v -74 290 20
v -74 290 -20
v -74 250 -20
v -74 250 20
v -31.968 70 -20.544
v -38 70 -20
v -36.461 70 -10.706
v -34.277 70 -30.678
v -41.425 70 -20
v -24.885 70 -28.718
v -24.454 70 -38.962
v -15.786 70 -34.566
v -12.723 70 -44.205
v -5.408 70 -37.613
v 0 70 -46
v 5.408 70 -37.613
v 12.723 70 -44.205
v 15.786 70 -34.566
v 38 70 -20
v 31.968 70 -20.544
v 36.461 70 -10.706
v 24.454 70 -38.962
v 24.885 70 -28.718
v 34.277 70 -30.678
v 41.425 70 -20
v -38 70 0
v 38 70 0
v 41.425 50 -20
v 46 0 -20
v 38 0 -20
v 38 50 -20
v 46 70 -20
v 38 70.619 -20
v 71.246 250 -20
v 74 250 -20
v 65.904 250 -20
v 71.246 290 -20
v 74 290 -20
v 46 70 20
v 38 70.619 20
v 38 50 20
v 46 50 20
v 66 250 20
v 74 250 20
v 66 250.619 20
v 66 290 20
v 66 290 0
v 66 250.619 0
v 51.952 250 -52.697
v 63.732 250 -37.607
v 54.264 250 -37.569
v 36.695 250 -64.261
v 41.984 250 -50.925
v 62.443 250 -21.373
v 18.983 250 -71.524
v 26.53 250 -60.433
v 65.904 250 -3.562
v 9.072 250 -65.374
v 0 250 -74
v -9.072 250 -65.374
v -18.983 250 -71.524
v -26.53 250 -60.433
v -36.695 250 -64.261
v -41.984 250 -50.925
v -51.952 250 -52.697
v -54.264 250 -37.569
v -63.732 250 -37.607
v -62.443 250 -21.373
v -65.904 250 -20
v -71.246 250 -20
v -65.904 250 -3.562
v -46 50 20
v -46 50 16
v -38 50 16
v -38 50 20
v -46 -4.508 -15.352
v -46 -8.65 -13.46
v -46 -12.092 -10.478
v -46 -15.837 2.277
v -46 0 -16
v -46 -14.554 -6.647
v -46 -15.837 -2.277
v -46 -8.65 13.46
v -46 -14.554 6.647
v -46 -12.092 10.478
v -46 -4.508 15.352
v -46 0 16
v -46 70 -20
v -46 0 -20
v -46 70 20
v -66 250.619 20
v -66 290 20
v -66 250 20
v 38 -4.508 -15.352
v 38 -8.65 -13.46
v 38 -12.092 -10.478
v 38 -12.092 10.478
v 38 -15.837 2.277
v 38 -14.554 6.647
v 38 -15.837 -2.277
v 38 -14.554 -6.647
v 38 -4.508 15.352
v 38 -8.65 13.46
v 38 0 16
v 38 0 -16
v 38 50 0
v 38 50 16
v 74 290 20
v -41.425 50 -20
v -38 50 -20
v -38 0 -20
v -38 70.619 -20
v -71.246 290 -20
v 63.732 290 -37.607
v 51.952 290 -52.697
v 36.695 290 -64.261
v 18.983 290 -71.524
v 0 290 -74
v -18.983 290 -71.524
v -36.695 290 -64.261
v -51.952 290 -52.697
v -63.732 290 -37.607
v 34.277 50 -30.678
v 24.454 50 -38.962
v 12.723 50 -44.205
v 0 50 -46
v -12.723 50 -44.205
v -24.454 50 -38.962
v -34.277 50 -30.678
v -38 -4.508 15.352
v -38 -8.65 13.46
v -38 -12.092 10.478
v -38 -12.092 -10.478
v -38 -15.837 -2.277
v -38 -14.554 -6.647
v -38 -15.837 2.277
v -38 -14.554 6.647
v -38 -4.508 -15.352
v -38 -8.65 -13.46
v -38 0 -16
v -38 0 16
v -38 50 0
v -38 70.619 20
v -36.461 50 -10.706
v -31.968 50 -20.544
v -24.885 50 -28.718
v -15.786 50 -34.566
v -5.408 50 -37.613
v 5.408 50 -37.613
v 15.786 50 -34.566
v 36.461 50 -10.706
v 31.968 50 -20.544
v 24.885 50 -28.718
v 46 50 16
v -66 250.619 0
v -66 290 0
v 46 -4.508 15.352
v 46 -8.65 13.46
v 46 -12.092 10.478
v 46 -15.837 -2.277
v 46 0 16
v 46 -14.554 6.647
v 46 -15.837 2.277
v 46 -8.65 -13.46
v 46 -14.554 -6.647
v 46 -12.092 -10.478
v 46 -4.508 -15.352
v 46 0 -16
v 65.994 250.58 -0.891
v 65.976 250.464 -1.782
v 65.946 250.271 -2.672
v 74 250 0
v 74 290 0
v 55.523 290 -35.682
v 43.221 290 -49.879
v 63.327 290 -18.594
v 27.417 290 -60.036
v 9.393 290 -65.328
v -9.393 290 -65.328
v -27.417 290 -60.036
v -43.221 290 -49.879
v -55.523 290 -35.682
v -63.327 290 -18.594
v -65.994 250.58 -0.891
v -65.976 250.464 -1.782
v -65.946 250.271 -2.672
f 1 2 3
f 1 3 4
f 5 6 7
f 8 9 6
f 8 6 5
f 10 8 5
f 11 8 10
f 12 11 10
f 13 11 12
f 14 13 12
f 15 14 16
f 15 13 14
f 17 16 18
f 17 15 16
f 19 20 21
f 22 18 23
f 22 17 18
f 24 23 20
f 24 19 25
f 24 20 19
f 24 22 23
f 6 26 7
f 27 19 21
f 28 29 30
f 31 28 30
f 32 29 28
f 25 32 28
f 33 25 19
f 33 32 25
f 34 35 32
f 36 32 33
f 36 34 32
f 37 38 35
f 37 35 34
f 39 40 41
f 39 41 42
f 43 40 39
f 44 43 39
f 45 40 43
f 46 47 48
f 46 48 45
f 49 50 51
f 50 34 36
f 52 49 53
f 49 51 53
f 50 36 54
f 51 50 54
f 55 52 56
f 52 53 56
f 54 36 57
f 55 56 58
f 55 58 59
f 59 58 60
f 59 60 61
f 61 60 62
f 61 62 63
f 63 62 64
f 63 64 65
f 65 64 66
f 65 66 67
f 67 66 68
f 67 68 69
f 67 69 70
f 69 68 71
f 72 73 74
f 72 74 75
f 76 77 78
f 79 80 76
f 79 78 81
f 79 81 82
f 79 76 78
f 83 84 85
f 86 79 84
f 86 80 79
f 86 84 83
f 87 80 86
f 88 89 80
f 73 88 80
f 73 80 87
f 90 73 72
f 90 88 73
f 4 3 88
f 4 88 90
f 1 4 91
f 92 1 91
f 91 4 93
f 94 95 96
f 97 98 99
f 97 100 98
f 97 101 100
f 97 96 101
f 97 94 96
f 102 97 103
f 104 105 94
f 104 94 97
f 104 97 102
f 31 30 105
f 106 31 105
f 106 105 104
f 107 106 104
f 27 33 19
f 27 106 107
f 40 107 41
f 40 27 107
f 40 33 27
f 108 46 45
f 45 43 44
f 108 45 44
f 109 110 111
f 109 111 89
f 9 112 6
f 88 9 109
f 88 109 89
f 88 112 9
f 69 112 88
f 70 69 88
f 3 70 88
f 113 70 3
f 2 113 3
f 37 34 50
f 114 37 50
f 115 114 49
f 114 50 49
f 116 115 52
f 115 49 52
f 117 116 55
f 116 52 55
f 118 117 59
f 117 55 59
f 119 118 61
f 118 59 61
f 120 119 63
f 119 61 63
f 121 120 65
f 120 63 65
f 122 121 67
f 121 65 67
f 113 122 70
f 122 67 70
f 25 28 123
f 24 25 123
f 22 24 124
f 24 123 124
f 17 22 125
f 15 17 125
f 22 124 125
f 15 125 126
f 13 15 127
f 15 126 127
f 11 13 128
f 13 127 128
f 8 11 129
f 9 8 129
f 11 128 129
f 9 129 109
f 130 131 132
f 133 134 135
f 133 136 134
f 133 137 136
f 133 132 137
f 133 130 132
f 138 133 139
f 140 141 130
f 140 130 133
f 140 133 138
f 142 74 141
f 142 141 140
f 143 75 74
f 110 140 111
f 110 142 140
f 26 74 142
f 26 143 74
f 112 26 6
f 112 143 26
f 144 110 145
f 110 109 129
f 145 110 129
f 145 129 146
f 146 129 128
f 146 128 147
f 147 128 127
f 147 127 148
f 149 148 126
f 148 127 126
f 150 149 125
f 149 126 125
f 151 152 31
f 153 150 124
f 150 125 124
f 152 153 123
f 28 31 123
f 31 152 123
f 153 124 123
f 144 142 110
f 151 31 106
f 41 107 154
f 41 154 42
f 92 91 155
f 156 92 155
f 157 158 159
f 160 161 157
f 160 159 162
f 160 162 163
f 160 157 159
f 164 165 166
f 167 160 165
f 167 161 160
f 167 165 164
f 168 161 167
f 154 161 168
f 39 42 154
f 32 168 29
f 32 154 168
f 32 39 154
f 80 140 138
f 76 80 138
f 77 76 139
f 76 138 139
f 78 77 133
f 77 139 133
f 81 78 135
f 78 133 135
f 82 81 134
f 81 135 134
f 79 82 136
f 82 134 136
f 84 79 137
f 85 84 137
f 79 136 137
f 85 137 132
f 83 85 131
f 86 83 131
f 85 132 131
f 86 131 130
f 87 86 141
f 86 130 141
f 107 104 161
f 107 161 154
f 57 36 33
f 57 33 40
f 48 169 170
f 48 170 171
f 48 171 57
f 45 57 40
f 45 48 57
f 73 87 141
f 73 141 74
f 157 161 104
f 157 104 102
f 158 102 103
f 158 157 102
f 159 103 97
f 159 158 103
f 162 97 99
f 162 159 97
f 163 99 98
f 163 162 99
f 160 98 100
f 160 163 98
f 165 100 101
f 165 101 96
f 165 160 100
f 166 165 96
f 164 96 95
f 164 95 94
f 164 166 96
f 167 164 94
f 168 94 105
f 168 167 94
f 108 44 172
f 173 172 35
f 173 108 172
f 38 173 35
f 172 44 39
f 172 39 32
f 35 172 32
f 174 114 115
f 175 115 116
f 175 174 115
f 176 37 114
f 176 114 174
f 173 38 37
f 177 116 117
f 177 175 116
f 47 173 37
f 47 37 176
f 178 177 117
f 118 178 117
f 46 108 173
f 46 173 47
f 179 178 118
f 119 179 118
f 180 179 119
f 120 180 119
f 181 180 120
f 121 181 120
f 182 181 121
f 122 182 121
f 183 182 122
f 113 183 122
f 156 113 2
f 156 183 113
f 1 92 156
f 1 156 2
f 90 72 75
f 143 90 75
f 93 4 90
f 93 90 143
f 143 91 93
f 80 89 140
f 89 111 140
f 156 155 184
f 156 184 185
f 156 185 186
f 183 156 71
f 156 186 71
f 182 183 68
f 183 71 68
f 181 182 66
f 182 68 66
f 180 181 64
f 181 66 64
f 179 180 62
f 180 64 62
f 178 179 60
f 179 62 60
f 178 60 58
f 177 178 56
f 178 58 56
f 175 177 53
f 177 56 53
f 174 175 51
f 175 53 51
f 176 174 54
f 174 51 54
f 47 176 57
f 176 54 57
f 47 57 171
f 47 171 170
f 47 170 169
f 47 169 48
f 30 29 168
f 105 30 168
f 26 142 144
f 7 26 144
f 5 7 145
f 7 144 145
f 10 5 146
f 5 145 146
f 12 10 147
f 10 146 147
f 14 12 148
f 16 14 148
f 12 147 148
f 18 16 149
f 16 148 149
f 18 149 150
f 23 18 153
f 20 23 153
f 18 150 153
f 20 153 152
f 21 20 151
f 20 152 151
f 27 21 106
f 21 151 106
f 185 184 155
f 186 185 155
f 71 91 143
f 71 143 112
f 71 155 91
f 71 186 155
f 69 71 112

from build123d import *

# Parameters (mm, degrees)
EXTRUDE_4_DEPTH     = 20
EXTRUDE_START       = 50
EXTRUDE_8_DEPTH     = 20
SKETCH_16_W         = 8
SKETCH_16_H         = 40
SKETCH_19_W         = 8
SKETCH_19_H         = 40
SKETCH_21_R         = 16
EXTRUDE_13_DEPTH    = 8
EXTRUDE_START_2     = -8
SKETCH_22_R         = 16
EXTRUDE_14_DEPTH    = 8
SKETCH_23_W         = 7.590296008
SKETCH_23_H         = 50
CUT_EXTRUDE_2_DEPTH = 323.453097365


# Read off the part's stored shape, not the designer's step: 凸台-拉伸8
with BuildPart() as part:
    # Sketch 3D_1 → 凸台-拉伸4 (new, symmetric)
    with BuildSketch(Plane(origin=(-74, 270, 0), x_dir=(0.9909924304103234, 0, 0.13391789600139506), z_dir=(0, -1, 0))):
        with BuildLine():
            Line((0, 0), (2.67835792, 19.819848608))
            Line((2.67835792, 19.819848608), (10.606297363, 18.74850544))
            Line((10.606297363, 18.74850544), (7.927939443, -1.071343168))
            ThreePointArc((7.927939443, -1.071343168), (64.494858714, -75.315424711), (138.738940257, -18.74850544))
            Line((138.738940257, -18.74850544), (141.417298177, 1.071343168))
            Line((141.417298177, 1.071343168), (149.345237621, 0))
            Line((149.345237621, 0), (146.666879701, -19.819848608))
            ThreePointArc((146.666879701, -19.819848608), (63.423515546, -83.243364154), (0, 0))
        make_face()
    extrude(amount=EXTRUDE_4_DEPTH, both=True)



with BuildPart() as body_2:
    # 凸台-拉伸8 outline → 凸台-拉伸8 (new body)
    with BuildSketch(Plane(origin=(0, 0, 0), x_dir=(1, 0, 0), z_dir=(0, 1, 0)).offset(EXTRUDE_START)):
        with BuildLine():
            Line((38, 0), (38, -20))
            Line((38, -20), (46, -20))
            Line((46, -20), (46, 0))
            ThreePointArc((46, 0), (0, 46), (-46, 0))
            Line((-46, 0), (-46, -20))
            Line((-46, -20), (-38, -20))
            Line((-38, -20), (-38, 0))
            ThreePointArc((-38, 0), (0, 38), (38, 0))
        make_face()
    extrude(amount=EXTRUDE_8_DEPTH)


with BuildPart() as part_1:
    add(part.part)

    add(body_2.part)  # 扫描5 merges body 2
    # 扫描5: sweep along a path in 草图18
    with BuildLine(Plane.XY.offset(20)) as sweep_5_path:
        Line((-46, 0), (-46, 50))
        Line((-46, 50), (-46, 70))
        Line((-46, 70), (-74, 250))
        Line((-74, 250), (-74, 290))
    # 草图16 → 扫描5 (sweep)
    with BuildSketch(Plane(origin=(0, 0, 0), x_dir=(1, 0, 0), z_dir=(0, 1, 0))):
        with Locations((-42, 0)):
            Rectangle(SKETCH_16_W, SKETCH_16_H)
    sweep(path=sweep_5_path.line, transition=Transition.RIGHT)

    # 扫描6: sweep along a path in 草图20
    with BuildLine(Plane.XY.offset(20)) as sweep_6_path:
        Line((46, 0), (46, 50))
        Line((46, 50), (46, 70))
        Line((46, 70), (74, 250))
        Line((74, 250), (74, 290))
    # 草图19 → 扫描6 (sweep)
    with BuildSketch(Plane(origin=(0, 0, 0), x_dir=(1, 0, 0), z_dir=(0, 1, 0))):
        with Locations((42, 0)):
            Rectangle(SKETCH_19_W, SKETCH_19_H)
    sweep(path=sweep_6_path.line, transition=Transition.RIGHT)

    # 草图21 → 凸台-拉伸13 (add)
    with BuildSketch(Plane(origin=(46, 0, 0), x_dir=(0, 0, -1), z_dir=(1, 0, 0))):
        Circle(SKETCH_21_R)
    extrude(amount=-EXTRUDE_13_DEPTH)

    # 草图22 → 凸台-拉伸14 (add)
    with BuildSketch(Plane.ZY.offset(46).offset(EXTRUDE_START_2)):
        Circle(SKETCH_22_R)
    extrude(amount=EXTRUDE_14_DEPTH)

    # 草图23 → 切除-拉伸2 (cut, through all)
    with BuildSketch(Plane.ZY.offset(46)):
        with Locations((19.795148004, 25)):
            Rectangle(SKETCH_23_W, SKETCH_23_H)
    extrude(amount=-CUT_EXTRUDE_2_DEPTH, mode=Mode.SUBTRACT)


solid = part_1.part
